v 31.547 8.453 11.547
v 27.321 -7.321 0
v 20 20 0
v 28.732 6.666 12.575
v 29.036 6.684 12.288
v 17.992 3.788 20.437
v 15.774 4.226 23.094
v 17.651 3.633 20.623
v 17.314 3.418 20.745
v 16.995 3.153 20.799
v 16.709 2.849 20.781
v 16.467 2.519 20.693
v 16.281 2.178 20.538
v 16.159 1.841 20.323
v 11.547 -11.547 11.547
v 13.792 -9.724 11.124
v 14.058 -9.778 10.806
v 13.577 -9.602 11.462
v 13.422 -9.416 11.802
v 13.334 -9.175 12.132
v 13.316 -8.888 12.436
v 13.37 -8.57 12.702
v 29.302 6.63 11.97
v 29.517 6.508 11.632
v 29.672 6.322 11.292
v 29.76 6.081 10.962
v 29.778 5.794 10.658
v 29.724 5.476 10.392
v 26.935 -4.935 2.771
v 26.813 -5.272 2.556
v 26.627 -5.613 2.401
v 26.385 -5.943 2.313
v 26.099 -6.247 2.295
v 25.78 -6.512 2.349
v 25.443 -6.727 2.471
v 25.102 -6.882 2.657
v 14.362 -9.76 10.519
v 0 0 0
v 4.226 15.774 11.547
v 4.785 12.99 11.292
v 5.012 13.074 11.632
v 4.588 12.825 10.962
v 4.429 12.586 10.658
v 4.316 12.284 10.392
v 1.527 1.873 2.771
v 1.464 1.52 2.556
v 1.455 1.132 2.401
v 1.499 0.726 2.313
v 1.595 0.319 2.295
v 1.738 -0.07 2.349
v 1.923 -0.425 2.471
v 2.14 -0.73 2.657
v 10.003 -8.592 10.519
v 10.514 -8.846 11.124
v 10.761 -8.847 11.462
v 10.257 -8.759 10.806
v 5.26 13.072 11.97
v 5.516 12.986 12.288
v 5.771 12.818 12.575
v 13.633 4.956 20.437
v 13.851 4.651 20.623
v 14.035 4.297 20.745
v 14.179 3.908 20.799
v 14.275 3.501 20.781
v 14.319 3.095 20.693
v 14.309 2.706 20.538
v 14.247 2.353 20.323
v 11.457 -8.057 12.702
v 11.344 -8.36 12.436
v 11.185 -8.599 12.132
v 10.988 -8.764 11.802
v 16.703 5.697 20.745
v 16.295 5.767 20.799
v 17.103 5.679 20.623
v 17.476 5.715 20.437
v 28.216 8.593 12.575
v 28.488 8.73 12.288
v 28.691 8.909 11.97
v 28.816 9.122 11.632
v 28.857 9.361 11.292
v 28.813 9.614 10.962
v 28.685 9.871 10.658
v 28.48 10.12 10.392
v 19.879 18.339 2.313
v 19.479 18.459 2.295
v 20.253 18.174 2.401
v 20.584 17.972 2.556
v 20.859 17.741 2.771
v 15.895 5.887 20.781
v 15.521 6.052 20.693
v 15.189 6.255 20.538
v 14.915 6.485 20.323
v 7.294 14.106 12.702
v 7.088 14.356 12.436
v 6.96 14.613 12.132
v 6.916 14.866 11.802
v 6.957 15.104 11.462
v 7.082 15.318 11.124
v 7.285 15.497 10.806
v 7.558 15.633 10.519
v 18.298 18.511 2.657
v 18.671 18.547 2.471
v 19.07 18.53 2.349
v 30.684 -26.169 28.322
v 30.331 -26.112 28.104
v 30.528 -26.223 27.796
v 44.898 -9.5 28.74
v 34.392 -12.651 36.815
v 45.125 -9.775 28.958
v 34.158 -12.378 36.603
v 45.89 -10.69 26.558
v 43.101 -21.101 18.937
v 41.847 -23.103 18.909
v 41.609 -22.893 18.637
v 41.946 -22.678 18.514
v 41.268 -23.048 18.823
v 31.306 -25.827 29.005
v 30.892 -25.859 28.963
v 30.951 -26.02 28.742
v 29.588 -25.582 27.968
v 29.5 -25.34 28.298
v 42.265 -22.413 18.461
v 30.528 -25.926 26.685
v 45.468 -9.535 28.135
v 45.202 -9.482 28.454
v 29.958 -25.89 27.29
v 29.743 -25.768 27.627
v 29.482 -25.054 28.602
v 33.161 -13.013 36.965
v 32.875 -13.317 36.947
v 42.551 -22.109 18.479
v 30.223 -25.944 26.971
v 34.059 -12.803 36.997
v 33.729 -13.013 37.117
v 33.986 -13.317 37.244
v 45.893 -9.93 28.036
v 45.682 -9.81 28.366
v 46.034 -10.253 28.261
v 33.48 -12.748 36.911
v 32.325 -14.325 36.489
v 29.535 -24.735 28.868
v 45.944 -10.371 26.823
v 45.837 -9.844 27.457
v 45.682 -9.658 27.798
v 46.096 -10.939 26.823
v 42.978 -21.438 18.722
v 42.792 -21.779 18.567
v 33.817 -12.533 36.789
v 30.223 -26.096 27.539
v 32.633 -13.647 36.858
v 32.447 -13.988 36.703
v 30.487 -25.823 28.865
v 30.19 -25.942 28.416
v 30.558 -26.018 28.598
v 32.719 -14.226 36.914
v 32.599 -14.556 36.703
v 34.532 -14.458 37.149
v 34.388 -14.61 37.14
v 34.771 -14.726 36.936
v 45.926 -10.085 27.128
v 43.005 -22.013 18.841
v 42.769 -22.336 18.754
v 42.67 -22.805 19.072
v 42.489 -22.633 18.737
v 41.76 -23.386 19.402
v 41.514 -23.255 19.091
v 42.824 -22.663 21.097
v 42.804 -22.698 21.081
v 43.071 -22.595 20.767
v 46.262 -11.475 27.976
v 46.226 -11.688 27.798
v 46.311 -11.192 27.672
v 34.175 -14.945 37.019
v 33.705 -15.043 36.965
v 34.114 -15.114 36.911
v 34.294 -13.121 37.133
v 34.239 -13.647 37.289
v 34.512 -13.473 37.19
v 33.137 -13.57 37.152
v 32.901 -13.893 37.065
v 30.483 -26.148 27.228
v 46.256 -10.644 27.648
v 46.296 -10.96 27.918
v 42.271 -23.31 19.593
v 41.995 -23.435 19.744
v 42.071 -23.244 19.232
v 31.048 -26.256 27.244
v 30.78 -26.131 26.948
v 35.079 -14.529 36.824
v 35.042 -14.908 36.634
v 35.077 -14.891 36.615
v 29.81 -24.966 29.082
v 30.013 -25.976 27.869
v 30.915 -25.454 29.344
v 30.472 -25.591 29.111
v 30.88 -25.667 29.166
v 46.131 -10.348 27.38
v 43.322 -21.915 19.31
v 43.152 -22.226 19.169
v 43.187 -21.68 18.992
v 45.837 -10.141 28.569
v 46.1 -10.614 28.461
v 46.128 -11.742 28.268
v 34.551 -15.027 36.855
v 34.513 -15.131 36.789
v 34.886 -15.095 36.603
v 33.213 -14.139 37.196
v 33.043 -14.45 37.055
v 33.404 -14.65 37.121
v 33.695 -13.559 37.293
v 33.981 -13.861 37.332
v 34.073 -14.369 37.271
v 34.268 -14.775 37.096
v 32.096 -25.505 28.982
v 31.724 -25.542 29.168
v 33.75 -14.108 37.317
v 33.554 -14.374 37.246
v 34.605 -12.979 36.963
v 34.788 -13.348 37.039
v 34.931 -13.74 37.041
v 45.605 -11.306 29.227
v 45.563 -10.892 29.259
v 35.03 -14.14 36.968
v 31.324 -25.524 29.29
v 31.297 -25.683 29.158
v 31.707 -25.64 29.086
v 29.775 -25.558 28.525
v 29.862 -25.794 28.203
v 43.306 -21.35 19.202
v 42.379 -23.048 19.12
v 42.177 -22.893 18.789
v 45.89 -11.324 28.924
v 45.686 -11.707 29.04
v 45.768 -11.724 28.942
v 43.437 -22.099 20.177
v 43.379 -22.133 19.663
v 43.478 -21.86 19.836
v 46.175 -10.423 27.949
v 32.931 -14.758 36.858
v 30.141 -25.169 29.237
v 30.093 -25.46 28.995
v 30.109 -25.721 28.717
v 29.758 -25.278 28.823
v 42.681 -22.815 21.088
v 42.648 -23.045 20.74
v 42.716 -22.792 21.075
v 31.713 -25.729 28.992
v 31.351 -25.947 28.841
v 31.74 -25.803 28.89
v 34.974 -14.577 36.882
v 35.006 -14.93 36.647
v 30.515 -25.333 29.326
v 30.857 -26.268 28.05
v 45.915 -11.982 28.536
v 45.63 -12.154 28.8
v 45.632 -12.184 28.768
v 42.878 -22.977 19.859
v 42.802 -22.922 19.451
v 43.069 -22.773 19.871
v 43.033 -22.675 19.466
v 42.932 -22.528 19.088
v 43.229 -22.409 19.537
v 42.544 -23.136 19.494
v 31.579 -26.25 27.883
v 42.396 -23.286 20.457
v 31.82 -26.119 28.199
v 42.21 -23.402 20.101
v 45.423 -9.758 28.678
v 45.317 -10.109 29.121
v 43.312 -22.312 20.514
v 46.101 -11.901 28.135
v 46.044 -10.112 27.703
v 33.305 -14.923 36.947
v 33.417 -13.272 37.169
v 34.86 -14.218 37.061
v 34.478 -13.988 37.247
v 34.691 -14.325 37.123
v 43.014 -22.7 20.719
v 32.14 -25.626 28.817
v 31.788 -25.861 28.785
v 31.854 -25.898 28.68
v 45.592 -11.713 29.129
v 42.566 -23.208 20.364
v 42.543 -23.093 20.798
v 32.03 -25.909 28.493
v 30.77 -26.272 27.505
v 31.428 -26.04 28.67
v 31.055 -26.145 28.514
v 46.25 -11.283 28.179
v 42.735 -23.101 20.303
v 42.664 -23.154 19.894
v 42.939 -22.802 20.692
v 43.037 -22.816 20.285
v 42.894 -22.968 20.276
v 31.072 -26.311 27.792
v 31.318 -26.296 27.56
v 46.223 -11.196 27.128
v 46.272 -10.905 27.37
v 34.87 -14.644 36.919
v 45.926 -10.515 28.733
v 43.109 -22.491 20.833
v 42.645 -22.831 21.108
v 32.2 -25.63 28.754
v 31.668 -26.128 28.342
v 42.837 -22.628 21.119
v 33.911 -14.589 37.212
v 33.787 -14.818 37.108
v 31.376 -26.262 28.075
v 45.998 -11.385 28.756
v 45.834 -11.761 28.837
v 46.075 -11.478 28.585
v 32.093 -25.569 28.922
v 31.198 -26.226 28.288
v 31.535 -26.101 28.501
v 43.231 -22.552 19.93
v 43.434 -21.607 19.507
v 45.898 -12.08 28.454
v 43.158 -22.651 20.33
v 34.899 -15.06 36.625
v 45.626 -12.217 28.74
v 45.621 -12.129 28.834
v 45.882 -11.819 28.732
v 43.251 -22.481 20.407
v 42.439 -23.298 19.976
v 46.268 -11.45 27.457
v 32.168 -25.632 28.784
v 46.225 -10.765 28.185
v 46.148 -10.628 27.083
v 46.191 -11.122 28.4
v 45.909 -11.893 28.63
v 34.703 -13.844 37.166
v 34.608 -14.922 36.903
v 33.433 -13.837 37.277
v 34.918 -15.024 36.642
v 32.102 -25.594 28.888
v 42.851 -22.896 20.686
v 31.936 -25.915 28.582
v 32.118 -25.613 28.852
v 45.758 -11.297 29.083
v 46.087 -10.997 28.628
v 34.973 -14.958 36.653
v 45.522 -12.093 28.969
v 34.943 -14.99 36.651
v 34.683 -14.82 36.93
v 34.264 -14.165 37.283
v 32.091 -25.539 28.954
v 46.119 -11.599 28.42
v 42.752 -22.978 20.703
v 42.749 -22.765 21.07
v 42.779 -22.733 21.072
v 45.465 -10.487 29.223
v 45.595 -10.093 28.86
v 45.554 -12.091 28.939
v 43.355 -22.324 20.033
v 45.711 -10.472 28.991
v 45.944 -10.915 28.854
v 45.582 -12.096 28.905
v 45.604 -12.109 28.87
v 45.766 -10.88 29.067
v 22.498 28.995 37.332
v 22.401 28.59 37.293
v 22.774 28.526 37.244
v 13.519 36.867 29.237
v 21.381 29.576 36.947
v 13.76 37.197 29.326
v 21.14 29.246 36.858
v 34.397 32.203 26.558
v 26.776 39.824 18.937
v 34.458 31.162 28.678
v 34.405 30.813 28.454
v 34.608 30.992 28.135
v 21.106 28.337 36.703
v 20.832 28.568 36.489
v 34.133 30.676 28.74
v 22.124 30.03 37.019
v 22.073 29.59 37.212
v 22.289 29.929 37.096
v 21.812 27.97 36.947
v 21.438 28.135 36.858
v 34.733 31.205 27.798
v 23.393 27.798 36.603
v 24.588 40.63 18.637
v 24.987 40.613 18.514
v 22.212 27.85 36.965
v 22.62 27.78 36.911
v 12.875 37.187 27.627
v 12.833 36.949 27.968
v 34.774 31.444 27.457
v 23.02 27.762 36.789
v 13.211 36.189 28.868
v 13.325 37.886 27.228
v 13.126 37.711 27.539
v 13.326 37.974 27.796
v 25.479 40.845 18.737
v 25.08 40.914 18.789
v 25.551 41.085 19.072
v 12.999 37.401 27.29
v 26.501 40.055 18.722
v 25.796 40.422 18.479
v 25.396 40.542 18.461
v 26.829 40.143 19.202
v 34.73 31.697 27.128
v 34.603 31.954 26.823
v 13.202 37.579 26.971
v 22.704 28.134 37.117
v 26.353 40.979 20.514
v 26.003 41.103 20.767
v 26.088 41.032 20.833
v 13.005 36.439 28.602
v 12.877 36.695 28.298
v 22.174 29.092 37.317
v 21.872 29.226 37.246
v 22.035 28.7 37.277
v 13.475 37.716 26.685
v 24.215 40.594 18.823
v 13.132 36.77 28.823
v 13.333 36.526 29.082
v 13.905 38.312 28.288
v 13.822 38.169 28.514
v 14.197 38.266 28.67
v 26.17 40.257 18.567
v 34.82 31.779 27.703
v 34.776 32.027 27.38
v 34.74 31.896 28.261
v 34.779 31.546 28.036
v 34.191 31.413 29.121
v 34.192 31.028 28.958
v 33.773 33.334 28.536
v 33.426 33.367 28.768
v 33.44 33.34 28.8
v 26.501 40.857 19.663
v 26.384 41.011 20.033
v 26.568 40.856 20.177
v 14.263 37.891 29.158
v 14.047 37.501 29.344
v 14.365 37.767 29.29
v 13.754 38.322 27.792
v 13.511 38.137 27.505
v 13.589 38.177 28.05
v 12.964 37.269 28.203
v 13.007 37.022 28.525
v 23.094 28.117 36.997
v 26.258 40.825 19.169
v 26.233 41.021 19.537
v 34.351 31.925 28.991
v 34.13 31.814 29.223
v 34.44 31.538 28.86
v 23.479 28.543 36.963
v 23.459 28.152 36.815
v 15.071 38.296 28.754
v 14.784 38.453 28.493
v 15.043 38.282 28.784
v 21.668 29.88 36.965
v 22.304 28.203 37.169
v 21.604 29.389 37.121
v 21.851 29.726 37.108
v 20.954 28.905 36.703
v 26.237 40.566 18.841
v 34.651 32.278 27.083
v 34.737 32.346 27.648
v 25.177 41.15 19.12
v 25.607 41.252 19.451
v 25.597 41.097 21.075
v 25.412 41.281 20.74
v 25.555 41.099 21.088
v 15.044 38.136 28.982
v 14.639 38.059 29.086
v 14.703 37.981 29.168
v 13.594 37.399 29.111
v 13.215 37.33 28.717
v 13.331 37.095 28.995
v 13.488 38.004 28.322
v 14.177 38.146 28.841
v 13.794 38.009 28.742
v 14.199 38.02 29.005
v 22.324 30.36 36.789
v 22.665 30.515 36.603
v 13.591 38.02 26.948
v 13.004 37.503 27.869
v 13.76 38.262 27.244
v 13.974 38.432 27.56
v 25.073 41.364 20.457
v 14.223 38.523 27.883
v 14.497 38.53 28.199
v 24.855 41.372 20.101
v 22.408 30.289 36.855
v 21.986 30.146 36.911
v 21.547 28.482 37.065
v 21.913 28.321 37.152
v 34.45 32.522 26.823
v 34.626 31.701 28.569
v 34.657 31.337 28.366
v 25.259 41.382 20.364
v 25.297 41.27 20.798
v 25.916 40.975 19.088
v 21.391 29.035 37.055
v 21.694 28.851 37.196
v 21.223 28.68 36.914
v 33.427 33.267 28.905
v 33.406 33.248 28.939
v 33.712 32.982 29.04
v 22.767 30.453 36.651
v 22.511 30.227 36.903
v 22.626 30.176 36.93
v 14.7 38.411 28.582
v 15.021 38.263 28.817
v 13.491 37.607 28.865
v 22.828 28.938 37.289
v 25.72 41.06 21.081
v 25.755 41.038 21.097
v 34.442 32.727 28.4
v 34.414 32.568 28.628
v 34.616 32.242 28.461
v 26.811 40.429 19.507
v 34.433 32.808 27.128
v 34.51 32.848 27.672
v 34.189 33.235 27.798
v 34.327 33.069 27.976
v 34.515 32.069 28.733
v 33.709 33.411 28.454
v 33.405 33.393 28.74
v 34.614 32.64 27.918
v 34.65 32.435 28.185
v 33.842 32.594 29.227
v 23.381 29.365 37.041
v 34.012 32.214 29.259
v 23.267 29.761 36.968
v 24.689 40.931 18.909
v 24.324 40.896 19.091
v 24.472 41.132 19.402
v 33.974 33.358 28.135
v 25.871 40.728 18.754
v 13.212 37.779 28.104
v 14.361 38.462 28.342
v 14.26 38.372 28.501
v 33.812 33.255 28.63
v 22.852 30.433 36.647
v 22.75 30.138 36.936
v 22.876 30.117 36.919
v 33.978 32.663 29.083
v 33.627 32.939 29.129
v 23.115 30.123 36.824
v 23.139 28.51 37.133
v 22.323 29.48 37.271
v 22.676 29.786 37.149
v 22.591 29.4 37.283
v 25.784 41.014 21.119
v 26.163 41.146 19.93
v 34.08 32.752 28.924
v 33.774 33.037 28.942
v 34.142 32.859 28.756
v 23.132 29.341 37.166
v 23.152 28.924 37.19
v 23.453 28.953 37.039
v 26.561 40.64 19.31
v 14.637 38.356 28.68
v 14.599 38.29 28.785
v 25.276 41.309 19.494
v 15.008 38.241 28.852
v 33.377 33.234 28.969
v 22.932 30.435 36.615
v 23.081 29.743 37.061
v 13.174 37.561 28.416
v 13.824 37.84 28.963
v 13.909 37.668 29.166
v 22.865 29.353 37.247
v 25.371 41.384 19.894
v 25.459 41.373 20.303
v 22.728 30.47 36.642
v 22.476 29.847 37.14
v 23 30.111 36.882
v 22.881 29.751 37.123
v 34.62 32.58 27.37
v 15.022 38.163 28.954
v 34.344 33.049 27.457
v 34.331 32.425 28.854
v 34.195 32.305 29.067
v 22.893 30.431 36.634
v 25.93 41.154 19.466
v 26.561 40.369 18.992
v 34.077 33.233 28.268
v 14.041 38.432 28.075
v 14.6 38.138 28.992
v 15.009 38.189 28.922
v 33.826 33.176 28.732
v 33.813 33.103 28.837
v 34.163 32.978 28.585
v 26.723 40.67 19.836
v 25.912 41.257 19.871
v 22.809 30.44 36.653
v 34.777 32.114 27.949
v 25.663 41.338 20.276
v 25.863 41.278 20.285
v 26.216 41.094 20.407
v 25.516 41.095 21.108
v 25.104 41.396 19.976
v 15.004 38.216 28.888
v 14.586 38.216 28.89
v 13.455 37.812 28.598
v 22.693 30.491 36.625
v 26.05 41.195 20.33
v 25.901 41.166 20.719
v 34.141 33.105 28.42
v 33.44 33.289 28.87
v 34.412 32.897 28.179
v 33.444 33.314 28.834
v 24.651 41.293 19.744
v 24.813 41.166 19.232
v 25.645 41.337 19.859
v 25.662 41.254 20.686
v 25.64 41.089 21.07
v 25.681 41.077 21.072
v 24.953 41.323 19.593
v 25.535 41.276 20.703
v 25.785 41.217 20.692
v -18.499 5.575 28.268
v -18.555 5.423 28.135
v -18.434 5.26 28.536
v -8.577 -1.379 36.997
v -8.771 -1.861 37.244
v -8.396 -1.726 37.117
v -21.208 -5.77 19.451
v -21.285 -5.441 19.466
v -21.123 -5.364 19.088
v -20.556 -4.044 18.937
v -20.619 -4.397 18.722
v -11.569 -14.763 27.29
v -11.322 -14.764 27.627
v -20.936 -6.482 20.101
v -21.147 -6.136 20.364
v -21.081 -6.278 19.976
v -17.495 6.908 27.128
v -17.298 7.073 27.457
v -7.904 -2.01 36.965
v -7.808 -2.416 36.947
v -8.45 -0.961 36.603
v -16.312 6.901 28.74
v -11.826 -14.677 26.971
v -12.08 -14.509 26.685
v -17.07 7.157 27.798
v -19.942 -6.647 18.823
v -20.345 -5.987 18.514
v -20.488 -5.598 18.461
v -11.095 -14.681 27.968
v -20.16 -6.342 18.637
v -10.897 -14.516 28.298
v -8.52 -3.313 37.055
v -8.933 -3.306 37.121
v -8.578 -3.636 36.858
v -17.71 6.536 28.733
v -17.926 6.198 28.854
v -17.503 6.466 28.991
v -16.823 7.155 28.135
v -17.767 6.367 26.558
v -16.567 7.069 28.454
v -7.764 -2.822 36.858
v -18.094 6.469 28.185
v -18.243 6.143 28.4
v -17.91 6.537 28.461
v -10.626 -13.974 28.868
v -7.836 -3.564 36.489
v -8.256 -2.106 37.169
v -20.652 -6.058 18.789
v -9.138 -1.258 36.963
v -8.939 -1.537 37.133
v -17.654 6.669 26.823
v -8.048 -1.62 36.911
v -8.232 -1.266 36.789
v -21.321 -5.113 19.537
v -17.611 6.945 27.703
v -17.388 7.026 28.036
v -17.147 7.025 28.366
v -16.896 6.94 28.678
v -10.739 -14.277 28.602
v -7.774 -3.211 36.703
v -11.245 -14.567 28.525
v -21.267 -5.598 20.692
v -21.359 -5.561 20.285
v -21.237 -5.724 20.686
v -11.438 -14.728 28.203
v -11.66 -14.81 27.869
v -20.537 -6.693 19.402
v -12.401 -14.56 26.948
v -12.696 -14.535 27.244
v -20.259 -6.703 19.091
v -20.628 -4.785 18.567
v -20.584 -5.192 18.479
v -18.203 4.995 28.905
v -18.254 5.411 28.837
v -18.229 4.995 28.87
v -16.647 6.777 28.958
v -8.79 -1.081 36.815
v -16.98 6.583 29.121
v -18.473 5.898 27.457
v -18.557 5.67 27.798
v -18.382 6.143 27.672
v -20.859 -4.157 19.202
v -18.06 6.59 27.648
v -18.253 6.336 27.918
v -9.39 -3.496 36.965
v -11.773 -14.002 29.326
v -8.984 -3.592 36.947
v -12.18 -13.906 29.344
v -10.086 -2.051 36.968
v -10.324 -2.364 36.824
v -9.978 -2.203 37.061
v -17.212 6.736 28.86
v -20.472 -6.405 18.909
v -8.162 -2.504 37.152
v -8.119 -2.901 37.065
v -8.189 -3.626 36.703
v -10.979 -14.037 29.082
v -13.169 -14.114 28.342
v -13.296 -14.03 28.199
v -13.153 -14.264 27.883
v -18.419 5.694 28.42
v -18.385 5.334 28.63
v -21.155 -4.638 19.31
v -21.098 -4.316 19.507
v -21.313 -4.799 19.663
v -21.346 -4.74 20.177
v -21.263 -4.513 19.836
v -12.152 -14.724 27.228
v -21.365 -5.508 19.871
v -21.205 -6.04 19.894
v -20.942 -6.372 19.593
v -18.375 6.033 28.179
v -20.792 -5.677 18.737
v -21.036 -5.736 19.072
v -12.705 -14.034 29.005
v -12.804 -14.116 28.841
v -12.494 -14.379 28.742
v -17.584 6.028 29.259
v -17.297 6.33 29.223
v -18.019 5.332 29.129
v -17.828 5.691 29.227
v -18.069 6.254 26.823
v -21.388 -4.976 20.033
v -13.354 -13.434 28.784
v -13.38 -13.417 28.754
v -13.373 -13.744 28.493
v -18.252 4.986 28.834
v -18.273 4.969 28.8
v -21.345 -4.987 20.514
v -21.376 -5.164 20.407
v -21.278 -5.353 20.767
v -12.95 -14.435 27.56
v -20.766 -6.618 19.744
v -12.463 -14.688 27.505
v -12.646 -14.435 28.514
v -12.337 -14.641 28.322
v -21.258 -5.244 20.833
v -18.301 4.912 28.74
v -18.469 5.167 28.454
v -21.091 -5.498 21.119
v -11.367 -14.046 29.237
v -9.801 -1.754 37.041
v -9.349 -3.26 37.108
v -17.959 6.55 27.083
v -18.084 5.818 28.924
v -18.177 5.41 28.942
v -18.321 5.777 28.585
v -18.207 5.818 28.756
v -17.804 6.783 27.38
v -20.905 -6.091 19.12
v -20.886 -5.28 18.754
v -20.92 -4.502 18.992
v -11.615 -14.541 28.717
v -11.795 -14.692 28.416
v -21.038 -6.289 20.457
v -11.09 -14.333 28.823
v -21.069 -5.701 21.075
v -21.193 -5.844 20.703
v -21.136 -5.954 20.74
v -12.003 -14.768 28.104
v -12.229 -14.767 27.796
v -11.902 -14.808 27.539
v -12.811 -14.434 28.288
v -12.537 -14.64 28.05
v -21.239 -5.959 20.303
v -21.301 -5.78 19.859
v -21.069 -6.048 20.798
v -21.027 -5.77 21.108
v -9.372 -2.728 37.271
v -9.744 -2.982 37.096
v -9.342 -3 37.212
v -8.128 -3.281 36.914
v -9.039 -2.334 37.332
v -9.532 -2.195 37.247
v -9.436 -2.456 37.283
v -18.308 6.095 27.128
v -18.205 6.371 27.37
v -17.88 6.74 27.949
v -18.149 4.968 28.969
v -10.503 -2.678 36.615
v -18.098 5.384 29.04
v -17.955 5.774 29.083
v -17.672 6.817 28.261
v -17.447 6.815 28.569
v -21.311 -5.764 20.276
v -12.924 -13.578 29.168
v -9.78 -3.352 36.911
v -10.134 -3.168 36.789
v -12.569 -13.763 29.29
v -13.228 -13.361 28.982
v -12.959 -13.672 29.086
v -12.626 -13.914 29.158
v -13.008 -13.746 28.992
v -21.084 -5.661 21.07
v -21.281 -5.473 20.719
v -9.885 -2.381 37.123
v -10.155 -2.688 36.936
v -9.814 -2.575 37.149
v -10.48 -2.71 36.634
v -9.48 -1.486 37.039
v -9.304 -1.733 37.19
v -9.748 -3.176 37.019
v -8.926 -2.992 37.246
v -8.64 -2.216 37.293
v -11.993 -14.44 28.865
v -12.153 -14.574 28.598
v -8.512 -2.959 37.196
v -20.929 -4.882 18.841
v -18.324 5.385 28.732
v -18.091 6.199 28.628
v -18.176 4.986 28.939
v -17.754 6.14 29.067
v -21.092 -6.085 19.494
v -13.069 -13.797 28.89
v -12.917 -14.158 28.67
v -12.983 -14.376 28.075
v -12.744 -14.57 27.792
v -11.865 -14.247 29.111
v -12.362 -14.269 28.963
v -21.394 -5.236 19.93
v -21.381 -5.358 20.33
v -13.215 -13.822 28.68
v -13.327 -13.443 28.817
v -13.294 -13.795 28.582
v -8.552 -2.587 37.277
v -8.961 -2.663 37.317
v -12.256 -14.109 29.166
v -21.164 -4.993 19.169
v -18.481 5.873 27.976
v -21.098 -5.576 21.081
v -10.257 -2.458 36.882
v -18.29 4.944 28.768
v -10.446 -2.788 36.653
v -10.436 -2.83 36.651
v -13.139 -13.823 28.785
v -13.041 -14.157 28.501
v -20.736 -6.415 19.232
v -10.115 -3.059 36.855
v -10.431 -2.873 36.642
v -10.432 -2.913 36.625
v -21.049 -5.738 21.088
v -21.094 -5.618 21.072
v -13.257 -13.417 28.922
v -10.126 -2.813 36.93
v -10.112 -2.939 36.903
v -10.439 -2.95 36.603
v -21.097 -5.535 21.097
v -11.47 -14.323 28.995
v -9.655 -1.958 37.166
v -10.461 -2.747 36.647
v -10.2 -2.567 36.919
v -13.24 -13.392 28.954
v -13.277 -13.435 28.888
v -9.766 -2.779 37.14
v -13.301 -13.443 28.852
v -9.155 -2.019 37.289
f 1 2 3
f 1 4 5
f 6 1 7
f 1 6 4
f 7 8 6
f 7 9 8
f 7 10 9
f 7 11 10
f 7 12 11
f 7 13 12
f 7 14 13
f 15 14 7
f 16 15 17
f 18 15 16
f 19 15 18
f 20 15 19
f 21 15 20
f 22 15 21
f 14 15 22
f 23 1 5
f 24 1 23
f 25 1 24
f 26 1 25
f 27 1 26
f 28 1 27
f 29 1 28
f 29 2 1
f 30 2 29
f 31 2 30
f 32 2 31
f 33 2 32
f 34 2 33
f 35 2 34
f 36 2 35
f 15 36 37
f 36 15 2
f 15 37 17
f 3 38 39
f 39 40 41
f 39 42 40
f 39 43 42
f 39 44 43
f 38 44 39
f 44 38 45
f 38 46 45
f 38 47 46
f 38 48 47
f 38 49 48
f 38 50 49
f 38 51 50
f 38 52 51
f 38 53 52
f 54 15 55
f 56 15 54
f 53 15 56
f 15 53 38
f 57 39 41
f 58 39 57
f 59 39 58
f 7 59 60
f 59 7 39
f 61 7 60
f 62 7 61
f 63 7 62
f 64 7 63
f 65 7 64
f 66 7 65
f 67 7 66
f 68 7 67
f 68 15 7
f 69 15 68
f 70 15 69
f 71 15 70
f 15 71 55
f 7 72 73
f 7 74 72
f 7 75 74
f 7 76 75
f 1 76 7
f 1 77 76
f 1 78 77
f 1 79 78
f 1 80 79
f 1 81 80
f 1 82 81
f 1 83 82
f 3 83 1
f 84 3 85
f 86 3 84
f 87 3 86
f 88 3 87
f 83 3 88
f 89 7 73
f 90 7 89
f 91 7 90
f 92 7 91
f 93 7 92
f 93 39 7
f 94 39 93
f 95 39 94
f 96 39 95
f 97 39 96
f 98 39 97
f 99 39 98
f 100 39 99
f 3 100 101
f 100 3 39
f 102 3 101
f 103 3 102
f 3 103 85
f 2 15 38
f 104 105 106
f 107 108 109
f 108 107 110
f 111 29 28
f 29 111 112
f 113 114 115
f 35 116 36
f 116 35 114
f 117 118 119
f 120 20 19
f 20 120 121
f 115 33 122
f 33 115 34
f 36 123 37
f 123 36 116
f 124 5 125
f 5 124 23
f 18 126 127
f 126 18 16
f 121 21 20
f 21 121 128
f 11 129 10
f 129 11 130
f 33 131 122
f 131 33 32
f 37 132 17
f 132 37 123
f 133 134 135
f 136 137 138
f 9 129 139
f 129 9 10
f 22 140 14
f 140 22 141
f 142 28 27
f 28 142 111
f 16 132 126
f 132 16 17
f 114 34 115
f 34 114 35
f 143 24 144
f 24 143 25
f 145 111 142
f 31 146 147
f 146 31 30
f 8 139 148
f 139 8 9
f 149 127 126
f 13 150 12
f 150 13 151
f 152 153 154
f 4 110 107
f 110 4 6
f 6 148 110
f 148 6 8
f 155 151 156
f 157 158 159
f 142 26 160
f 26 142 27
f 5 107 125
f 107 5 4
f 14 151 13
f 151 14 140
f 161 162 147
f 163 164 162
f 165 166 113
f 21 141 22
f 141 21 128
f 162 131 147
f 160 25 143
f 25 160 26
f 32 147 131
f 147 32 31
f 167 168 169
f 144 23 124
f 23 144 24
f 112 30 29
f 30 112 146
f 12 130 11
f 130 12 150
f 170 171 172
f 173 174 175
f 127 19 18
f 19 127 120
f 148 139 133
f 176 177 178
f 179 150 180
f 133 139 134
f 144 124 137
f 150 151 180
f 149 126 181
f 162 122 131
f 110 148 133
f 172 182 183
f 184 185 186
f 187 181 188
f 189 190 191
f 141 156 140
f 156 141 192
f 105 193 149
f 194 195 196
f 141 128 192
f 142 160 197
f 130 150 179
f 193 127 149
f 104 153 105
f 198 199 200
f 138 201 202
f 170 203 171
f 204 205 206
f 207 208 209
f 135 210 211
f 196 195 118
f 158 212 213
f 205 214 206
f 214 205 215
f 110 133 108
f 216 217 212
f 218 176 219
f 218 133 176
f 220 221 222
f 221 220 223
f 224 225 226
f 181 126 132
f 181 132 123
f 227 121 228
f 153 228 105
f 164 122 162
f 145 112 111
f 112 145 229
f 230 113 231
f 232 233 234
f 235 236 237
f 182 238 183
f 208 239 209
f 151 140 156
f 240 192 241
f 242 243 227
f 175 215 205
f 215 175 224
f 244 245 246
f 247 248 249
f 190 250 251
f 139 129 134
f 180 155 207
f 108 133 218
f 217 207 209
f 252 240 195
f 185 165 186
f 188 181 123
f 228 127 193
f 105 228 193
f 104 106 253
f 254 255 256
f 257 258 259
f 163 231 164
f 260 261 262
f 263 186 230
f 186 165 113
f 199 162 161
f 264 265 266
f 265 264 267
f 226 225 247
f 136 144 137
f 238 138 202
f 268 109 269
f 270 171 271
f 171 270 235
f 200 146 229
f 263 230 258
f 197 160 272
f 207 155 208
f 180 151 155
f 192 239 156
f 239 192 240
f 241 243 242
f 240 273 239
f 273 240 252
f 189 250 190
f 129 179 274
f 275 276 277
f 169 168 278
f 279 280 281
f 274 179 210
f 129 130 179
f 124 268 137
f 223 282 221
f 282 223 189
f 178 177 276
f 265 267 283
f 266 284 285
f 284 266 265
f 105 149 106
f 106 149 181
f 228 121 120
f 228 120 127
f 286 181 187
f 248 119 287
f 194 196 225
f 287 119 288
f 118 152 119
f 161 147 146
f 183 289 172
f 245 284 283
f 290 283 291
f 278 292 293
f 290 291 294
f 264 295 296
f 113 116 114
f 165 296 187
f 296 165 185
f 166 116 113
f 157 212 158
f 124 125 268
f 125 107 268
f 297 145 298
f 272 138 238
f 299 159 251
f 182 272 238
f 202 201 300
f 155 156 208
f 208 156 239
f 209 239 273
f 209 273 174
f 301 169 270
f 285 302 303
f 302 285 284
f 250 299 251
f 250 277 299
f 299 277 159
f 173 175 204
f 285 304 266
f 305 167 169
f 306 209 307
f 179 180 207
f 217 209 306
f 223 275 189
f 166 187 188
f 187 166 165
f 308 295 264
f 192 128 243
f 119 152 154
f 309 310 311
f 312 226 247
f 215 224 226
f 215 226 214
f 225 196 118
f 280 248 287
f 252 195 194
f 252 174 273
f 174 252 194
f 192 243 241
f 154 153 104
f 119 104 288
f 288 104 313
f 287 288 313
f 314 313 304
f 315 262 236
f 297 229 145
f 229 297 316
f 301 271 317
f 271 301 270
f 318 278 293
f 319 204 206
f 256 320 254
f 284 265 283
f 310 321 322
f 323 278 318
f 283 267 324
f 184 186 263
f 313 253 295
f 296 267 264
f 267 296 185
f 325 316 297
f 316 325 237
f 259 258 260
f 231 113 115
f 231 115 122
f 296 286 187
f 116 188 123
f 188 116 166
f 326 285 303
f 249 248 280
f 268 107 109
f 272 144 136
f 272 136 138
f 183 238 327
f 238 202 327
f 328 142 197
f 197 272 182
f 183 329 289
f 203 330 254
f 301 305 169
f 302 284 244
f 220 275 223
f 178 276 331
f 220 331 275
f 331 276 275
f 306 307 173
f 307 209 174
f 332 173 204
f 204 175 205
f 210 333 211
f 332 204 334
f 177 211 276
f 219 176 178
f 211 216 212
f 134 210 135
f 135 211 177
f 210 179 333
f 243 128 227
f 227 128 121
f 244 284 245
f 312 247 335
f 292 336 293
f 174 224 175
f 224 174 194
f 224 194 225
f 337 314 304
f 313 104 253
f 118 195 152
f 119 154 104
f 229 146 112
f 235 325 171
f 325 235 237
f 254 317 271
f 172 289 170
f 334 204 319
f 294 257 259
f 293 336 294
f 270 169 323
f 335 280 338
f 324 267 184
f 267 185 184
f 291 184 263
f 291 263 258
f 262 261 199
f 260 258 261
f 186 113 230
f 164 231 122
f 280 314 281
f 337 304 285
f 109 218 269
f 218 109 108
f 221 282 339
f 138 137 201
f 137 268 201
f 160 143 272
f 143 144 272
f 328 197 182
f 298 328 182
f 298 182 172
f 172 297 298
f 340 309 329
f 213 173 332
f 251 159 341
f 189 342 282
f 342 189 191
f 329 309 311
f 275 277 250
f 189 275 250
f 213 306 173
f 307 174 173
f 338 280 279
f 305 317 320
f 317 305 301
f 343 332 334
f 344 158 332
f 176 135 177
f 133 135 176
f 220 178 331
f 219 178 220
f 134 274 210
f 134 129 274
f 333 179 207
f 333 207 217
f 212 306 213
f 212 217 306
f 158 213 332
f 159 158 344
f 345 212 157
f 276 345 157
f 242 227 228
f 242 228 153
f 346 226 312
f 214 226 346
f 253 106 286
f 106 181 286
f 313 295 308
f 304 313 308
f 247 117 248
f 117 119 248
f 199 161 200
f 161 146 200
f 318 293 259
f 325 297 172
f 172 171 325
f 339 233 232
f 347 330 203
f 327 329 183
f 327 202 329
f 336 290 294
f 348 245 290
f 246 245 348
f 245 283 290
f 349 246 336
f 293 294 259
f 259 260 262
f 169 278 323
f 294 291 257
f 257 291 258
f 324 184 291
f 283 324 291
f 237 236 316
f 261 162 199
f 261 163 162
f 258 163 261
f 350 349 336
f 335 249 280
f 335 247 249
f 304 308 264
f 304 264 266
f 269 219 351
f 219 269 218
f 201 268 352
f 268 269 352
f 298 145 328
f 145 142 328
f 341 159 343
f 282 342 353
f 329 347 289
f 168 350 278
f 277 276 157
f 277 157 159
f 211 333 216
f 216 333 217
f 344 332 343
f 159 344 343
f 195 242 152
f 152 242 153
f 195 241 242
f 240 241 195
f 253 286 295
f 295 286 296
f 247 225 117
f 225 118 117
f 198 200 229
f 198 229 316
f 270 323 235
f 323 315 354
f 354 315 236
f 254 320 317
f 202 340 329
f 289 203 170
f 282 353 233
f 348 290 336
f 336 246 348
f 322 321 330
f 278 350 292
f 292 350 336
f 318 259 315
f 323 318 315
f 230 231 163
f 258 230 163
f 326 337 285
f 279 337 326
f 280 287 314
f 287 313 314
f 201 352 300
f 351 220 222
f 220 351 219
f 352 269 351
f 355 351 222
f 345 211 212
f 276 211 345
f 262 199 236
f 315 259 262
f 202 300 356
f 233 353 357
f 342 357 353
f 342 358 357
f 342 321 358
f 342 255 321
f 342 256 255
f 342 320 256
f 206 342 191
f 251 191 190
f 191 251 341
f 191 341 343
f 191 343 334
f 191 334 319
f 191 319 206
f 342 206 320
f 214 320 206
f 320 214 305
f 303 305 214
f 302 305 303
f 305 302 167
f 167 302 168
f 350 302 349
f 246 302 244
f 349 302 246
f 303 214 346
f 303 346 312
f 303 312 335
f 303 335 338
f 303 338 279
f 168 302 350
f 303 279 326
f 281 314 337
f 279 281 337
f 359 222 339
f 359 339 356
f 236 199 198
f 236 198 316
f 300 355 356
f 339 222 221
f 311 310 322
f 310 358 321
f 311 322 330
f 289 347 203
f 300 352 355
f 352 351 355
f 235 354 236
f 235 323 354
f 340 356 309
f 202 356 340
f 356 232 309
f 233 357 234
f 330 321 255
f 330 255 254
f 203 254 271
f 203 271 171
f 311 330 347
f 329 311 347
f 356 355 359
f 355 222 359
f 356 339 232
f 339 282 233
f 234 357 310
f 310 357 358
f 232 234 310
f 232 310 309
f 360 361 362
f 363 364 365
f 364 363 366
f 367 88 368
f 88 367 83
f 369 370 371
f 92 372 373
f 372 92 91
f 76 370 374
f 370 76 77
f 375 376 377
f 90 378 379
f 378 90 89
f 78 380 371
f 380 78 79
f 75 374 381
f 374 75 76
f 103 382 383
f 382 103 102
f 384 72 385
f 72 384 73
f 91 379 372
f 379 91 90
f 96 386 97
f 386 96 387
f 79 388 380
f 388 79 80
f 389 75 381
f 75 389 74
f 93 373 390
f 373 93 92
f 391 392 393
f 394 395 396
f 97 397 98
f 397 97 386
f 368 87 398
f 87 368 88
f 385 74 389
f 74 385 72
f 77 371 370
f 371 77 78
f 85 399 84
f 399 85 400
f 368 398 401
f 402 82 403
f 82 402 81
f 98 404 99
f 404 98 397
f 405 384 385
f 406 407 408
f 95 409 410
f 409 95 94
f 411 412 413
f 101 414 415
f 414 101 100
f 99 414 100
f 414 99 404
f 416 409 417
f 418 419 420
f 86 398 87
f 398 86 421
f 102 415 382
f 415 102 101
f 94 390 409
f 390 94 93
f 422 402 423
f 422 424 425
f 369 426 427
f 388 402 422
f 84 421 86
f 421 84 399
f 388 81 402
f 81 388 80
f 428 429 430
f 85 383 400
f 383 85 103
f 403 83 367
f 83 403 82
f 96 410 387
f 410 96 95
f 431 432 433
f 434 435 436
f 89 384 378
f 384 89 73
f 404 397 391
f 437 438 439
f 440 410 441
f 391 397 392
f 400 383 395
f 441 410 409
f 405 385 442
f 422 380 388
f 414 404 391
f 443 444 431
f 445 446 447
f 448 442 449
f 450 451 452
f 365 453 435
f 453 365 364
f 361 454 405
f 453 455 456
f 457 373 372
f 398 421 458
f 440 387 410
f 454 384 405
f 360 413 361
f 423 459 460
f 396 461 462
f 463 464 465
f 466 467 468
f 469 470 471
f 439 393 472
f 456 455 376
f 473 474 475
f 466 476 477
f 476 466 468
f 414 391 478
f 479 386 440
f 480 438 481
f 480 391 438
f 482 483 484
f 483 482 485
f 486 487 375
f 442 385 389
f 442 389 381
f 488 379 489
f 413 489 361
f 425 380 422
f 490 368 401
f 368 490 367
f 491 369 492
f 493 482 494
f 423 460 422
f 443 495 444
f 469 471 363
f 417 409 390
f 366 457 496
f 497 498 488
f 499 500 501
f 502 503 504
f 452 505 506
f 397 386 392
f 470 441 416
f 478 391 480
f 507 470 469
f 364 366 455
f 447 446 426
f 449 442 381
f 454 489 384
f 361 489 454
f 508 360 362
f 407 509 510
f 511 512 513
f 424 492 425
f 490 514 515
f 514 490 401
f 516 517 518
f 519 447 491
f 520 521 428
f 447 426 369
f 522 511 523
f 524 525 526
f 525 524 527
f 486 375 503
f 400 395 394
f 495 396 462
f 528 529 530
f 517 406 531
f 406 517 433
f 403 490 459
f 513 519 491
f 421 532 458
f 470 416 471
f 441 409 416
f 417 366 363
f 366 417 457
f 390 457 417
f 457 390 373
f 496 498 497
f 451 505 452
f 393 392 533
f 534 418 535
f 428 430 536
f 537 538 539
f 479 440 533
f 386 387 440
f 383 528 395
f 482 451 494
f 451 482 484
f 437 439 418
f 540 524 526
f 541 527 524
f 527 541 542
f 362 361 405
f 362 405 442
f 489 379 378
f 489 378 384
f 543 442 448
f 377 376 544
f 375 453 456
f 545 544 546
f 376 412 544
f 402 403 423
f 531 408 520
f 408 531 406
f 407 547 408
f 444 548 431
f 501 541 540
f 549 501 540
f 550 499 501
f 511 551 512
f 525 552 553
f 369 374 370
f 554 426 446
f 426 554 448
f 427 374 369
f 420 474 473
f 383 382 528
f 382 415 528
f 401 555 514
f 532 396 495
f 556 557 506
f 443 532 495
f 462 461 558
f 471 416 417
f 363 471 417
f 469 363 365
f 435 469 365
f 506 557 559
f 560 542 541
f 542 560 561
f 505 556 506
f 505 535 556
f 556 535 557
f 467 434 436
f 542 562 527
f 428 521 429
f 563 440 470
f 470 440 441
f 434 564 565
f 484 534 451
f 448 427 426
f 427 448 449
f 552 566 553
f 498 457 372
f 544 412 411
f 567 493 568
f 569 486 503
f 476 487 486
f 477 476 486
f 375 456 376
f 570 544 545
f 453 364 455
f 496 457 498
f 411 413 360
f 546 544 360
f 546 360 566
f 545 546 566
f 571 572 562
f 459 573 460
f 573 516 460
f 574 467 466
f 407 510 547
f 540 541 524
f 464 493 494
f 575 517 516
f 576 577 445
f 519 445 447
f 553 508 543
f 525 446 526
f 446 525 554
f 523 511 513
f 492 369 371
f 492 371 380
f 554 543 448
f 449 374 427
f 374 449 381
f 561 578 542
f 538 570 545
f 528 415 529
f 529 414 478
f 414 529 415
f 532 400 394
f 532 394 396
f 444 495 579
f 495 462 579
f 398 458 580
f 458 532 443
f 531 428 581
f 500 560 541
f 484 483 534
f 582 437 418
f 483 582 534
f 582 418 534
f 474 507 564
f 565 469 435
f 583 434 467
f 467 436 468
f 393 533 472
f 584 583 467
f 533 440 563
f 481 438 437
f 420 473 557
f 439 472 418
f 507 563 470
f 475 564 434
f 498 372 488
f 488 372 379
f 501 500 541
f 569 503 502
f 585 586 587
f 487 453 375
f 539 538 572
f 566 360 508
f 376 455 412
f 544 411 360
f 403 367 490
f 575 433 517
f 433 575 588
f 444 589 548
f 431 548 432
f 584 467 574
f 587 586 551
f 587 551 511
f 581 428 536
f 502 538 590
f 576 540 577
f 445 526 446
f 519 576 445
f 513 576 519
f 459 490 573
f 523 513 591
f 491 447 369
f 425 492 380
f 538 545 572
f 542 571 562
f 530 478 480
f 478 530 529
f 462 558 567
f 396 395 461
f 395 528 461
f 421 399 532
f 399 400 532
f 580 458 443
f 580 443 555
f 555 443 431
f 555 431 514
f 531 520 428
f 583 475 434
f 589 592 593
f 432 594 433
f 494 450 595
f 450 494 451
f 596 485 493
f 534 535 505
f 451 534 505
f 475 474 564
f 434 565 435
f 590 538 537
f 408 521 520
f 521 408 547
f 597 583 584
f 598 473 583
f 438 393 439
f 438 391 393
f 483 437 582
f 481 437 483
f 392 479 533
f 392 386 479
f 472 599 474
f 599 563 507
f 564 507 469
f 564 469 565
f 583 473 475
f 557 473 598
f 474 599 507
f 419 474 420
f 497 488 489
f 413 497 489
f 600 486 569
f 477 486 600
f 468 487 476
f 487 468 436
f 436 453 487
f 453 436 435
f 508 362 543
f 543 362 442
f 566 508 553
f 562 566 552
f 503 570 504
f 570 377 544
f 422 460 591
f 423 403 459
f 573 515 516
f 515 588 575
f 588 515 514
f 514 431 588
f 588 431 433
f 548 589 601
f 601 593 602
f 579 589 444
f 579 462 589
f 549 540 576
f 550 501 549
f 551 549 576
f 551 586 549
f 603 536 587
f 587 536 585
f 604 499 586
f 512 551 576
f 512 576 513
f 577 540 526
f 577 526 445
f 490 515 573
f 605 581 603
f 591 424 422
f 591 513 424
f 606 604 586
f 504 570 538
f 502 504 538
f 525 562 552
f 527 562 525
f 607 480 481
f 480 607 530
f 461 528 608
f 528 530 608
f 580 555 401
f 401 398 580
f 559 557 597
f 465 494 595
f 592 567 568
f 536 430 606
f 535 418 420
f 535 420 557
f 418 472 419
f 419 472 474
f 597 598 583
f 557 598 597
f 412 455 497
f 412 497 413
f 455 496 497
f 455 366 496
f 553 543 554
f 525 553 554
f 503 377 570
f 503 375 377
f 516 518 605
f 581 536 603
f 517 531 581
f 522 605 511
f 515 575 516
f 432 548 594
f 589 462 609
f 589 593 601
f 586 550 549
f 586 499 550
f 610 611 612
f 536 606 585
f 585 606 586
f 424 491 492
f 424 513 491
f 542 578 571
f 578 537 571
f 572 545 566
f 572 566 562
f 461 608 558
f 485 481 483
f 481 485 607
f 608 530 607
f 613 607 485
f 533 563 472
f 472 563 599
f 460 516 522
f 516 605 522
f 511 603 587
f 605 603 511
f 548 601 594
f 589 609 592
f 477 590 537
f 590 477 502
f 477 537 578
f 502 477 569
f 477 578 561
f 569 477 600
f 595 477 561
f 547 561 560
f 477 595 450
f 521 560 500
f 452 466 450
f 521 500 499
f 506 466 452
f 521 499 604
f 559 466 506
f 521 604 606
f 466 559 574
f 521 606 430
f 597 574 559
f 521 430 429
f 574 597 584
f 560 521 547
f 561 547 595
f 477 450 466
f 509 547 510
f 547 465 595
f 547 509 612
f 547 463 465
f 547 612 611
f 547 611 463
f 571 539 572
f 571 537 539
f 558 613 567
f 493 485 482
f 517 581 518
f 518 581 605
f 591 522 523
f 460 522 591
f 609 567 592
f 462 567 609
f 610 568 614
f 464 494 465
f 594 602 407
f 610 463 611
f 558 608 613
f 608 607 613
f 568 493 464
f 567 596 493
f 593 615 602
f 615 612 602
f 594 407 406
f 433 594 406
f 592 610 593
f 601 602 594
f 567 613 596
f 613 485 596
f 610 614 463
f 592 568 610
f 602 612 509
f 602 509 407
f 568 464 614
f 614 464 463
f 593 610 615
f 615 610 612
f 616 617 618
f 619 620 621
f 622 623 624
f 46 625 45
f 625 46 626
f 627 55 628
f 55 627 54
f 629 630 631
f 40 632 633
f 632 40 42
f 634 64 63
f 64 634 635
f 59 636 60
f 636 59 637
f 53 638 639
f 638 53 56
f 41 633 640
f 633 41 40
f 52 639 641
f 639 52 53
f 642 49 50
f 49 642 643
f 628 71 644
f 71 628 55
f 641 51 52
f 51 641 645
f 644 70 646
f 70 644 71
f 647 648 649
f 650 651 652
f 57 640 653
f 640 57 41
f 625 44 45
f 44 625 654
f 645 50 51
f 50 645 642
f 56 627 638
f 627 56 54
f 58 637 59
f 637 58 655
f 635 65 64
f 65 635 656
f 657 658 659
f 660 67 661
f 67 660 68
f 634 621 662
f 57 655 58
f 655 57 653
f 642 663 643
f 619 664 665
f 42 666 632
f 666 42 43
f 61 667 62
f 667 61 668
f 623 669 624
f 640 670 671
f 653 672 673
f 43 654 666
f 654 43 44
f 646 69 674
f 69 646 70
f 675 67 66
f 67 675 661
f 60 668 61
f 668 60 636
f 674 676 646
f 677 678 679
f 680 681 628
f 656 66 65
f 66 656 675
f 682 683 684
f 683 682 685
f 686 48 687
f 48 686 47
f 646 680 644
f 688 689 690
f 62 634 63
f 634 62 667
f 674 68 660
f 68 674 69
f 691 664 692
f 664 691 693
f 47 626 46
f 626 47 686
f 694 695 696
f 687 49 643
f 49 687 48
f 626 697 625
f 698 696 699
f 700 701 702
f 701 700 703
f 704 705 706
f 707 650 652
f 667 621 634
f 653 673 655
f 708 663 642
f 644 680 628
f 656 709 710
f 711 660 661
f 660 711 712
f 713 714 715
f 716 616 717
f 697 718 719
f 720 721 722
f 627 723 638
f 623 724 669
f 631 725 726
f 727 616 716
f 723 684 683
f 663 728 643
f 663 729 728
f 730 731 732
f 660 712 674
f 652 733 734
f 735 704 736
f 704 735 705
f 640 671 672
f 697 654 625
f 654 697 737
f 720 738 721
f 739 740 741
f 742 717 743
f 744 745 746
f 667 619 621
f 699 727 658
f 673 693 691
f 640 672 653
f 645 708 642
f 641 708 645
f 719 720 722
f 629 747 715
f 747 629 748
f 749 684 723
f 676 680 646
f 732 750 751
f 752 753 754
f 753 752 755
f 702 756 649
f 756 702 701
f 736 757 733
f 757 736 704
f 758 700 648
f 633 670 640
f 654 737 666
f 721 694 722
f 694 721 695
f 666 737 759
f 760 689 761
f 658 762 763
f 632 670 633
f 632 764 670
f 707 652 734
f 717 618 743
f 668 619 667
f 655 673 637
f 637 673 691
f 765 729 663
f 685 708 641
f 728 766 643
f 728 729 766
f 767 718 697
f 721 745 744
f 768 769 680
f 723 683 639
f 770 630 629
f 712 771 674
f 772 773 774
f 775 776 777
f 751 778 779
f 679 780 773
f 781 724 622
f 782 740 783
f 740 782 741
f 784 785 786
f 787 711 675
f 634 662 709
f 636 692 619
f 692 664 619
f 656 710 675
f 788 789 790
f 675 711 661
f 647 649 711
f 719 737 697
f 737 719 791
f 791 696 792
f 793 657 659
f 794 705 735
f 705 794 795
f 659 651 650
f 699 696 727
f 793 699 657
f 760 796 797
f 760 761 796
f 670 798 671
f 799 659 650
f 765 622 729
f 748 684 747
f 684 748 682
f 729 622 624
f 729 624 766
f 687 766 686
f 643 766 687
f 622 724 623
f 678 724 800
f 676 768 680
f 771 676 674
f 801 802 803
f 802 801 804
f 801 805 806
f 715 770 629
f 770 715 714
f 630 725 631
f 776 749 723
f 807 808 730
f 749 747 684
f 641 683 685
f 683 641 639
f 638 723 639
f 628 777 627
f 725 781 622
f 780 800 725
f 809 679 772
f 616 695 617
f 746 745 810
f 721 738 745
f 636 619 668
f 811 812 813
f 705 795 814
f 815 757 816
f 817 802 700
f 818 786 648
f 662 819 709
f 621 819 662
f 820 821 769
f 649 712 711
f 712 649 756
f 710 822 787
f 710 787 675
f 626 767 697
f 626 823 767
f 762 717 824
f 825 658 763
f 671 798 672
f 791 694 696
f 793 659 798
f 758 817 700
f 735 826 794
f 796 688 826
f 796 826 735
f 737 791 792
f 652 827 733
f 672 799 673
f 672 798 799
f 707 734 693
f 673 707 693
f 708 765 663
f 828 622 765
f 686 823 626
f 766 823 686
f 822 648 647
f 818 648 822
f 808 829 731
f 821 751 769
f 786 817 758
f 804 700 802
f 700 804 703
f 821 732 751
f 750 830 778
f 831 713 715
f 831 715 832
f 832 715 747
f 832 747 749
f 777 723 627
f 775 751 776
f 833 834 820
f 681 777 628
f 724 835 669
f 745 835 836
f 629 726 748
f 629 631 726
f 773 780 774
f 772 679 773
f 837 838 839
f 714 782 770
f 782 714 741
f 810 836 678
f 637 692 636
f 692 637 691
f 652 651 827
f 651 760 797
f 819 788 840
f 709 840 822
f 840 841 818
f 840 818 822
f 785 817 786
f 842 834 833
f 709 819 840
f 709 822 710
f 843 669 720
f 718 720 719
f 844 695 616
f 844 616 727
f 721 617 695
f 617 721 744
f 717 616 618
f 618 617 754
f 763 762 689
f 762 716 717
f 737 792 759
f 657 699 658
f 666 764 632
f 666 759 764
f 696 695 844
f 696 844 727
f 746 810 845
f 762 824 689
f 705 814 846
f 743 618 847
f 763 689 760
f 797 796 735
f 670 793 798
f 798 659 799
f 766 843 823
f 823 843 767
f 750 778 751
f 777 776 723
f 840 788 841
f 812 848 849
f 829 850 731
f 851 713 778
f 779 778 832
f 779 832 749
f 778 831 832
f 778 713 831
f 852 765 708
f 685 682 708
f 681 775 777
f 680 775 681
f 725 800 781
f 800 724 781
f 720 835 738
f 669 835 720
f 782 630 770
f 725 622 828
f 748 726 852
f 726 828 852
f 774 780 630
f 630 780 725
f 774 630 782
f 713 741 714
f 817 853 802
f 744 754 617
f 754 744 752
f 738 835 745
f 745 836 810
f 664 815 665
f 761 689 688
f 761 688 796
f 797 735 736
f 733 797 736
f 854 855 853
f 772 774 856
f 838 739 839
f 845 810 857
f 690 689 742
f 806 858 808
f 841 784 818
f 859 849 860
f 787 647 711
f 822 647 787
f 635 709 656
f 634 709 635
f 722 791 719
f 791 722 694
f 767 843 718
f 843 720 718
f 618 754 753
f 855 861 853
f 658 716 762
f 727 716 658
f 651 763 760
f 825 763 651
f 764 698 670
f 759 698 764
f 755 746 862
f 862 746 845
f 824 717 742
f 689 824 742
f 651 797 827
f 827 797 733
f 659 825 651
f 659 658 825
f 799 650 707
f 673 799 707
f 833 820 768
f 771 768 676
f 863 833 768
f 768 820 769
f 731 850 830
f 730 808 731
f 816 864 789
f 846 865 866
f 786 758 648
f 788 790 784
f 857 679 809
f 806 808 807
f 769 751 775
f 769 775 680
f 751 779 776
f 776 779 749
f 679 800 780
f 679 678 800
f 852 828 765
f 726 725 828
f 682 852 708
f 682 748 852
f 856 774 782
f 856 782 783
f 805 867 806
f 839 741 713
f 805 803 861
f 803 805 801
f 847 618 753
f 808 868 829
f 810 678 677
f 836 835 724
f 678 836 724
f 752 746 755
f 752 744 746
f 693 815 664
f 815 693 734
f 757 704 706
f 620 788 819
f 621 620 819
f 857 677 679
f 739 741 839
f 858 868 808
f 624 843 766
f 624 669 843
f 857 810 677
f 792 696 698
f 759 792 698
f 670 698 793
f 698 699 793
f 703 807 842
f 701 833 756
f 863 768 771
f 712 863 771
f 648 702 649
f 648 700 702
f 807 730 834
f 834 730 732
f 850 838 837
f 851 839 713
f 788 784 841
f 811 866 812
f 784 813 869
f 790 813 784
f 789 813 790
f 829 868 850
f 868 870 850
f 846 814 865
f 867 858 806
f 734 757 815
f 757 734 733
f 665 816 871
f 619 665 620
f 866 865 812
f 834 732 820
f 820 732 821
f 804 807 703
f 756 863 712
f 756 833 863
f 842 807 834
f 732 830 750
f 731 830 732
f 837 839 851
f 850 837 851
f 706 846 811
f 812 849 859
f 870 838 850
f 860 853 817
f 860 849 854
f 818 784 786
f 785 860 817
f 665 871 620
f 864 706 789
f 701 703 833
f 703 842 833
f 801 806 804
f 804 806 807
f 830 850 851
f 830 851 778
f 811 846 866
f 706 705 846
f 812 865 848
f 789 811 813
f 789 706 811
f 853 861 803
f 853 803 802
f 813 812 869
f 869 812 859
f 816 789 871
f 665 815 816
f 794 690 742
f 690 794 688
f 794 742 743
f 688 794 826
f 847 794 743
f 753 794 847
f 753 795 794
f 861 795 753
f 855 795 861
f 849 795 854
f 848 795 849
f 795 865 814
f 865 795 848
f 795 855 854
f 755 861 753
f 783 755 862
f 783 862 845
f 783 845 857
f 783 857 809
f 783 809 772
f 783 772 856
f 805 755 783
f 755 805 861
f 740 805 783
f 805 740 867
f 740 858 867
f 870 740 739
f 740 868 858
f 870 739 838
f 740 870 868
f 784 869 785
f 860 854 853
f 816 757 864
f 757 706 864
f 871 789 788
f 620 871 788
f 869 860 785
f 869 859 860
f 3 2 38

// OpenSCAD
// Outside dimension of the square tube
a = 20;
// Wall thickness of the tube
b = 1.2;
// How far the prongs should extend into the tube. Ideally, about 1.5 times the dimension of the tube.
c = 30;
// Clearance. More clearance makes the prongs fit looser. 0.2 produces a sliding fit on my printer.
d = 0.2;
// Radius of the rounding on the prongs. 2 is about right.
f = 2;


// Nice rounding on the round edges
$fs=0.02;

// plug cross section
e = a-b-b-d-d;

// Rounded top cylinder
module rts(h, r) {
    cylinder(h-r, r=r);
    translate([0,0,h-r]) sphere(r=r);
}

// One prong
module prong() {
    translate([b+d, b+d,a]) hull() {
        translate([f,f,0]) rts(c, f);
        translate([e-f,f,0]) rts(c, f);
        translate([f,e-f,0]) rts(c, f);
        translate([e-f,e-f,0]) rts(c, f);
    }
}

// All three prongs and connection, rotated to print without support
difference() {
    rotate(a=atan(sqrt(2)), v=[1,1,0]) union() {
        cube([a, a, a], center=false);
        prong();
        rotate([-90,0,0]) translate([0,-a,0]) prong();
        rotate([0,-90,0]) translate([0,0,-a]) prong();
    };
    translate([0,0,-4*a]) cube([a*8, a*8, a*8], center=true);
}
